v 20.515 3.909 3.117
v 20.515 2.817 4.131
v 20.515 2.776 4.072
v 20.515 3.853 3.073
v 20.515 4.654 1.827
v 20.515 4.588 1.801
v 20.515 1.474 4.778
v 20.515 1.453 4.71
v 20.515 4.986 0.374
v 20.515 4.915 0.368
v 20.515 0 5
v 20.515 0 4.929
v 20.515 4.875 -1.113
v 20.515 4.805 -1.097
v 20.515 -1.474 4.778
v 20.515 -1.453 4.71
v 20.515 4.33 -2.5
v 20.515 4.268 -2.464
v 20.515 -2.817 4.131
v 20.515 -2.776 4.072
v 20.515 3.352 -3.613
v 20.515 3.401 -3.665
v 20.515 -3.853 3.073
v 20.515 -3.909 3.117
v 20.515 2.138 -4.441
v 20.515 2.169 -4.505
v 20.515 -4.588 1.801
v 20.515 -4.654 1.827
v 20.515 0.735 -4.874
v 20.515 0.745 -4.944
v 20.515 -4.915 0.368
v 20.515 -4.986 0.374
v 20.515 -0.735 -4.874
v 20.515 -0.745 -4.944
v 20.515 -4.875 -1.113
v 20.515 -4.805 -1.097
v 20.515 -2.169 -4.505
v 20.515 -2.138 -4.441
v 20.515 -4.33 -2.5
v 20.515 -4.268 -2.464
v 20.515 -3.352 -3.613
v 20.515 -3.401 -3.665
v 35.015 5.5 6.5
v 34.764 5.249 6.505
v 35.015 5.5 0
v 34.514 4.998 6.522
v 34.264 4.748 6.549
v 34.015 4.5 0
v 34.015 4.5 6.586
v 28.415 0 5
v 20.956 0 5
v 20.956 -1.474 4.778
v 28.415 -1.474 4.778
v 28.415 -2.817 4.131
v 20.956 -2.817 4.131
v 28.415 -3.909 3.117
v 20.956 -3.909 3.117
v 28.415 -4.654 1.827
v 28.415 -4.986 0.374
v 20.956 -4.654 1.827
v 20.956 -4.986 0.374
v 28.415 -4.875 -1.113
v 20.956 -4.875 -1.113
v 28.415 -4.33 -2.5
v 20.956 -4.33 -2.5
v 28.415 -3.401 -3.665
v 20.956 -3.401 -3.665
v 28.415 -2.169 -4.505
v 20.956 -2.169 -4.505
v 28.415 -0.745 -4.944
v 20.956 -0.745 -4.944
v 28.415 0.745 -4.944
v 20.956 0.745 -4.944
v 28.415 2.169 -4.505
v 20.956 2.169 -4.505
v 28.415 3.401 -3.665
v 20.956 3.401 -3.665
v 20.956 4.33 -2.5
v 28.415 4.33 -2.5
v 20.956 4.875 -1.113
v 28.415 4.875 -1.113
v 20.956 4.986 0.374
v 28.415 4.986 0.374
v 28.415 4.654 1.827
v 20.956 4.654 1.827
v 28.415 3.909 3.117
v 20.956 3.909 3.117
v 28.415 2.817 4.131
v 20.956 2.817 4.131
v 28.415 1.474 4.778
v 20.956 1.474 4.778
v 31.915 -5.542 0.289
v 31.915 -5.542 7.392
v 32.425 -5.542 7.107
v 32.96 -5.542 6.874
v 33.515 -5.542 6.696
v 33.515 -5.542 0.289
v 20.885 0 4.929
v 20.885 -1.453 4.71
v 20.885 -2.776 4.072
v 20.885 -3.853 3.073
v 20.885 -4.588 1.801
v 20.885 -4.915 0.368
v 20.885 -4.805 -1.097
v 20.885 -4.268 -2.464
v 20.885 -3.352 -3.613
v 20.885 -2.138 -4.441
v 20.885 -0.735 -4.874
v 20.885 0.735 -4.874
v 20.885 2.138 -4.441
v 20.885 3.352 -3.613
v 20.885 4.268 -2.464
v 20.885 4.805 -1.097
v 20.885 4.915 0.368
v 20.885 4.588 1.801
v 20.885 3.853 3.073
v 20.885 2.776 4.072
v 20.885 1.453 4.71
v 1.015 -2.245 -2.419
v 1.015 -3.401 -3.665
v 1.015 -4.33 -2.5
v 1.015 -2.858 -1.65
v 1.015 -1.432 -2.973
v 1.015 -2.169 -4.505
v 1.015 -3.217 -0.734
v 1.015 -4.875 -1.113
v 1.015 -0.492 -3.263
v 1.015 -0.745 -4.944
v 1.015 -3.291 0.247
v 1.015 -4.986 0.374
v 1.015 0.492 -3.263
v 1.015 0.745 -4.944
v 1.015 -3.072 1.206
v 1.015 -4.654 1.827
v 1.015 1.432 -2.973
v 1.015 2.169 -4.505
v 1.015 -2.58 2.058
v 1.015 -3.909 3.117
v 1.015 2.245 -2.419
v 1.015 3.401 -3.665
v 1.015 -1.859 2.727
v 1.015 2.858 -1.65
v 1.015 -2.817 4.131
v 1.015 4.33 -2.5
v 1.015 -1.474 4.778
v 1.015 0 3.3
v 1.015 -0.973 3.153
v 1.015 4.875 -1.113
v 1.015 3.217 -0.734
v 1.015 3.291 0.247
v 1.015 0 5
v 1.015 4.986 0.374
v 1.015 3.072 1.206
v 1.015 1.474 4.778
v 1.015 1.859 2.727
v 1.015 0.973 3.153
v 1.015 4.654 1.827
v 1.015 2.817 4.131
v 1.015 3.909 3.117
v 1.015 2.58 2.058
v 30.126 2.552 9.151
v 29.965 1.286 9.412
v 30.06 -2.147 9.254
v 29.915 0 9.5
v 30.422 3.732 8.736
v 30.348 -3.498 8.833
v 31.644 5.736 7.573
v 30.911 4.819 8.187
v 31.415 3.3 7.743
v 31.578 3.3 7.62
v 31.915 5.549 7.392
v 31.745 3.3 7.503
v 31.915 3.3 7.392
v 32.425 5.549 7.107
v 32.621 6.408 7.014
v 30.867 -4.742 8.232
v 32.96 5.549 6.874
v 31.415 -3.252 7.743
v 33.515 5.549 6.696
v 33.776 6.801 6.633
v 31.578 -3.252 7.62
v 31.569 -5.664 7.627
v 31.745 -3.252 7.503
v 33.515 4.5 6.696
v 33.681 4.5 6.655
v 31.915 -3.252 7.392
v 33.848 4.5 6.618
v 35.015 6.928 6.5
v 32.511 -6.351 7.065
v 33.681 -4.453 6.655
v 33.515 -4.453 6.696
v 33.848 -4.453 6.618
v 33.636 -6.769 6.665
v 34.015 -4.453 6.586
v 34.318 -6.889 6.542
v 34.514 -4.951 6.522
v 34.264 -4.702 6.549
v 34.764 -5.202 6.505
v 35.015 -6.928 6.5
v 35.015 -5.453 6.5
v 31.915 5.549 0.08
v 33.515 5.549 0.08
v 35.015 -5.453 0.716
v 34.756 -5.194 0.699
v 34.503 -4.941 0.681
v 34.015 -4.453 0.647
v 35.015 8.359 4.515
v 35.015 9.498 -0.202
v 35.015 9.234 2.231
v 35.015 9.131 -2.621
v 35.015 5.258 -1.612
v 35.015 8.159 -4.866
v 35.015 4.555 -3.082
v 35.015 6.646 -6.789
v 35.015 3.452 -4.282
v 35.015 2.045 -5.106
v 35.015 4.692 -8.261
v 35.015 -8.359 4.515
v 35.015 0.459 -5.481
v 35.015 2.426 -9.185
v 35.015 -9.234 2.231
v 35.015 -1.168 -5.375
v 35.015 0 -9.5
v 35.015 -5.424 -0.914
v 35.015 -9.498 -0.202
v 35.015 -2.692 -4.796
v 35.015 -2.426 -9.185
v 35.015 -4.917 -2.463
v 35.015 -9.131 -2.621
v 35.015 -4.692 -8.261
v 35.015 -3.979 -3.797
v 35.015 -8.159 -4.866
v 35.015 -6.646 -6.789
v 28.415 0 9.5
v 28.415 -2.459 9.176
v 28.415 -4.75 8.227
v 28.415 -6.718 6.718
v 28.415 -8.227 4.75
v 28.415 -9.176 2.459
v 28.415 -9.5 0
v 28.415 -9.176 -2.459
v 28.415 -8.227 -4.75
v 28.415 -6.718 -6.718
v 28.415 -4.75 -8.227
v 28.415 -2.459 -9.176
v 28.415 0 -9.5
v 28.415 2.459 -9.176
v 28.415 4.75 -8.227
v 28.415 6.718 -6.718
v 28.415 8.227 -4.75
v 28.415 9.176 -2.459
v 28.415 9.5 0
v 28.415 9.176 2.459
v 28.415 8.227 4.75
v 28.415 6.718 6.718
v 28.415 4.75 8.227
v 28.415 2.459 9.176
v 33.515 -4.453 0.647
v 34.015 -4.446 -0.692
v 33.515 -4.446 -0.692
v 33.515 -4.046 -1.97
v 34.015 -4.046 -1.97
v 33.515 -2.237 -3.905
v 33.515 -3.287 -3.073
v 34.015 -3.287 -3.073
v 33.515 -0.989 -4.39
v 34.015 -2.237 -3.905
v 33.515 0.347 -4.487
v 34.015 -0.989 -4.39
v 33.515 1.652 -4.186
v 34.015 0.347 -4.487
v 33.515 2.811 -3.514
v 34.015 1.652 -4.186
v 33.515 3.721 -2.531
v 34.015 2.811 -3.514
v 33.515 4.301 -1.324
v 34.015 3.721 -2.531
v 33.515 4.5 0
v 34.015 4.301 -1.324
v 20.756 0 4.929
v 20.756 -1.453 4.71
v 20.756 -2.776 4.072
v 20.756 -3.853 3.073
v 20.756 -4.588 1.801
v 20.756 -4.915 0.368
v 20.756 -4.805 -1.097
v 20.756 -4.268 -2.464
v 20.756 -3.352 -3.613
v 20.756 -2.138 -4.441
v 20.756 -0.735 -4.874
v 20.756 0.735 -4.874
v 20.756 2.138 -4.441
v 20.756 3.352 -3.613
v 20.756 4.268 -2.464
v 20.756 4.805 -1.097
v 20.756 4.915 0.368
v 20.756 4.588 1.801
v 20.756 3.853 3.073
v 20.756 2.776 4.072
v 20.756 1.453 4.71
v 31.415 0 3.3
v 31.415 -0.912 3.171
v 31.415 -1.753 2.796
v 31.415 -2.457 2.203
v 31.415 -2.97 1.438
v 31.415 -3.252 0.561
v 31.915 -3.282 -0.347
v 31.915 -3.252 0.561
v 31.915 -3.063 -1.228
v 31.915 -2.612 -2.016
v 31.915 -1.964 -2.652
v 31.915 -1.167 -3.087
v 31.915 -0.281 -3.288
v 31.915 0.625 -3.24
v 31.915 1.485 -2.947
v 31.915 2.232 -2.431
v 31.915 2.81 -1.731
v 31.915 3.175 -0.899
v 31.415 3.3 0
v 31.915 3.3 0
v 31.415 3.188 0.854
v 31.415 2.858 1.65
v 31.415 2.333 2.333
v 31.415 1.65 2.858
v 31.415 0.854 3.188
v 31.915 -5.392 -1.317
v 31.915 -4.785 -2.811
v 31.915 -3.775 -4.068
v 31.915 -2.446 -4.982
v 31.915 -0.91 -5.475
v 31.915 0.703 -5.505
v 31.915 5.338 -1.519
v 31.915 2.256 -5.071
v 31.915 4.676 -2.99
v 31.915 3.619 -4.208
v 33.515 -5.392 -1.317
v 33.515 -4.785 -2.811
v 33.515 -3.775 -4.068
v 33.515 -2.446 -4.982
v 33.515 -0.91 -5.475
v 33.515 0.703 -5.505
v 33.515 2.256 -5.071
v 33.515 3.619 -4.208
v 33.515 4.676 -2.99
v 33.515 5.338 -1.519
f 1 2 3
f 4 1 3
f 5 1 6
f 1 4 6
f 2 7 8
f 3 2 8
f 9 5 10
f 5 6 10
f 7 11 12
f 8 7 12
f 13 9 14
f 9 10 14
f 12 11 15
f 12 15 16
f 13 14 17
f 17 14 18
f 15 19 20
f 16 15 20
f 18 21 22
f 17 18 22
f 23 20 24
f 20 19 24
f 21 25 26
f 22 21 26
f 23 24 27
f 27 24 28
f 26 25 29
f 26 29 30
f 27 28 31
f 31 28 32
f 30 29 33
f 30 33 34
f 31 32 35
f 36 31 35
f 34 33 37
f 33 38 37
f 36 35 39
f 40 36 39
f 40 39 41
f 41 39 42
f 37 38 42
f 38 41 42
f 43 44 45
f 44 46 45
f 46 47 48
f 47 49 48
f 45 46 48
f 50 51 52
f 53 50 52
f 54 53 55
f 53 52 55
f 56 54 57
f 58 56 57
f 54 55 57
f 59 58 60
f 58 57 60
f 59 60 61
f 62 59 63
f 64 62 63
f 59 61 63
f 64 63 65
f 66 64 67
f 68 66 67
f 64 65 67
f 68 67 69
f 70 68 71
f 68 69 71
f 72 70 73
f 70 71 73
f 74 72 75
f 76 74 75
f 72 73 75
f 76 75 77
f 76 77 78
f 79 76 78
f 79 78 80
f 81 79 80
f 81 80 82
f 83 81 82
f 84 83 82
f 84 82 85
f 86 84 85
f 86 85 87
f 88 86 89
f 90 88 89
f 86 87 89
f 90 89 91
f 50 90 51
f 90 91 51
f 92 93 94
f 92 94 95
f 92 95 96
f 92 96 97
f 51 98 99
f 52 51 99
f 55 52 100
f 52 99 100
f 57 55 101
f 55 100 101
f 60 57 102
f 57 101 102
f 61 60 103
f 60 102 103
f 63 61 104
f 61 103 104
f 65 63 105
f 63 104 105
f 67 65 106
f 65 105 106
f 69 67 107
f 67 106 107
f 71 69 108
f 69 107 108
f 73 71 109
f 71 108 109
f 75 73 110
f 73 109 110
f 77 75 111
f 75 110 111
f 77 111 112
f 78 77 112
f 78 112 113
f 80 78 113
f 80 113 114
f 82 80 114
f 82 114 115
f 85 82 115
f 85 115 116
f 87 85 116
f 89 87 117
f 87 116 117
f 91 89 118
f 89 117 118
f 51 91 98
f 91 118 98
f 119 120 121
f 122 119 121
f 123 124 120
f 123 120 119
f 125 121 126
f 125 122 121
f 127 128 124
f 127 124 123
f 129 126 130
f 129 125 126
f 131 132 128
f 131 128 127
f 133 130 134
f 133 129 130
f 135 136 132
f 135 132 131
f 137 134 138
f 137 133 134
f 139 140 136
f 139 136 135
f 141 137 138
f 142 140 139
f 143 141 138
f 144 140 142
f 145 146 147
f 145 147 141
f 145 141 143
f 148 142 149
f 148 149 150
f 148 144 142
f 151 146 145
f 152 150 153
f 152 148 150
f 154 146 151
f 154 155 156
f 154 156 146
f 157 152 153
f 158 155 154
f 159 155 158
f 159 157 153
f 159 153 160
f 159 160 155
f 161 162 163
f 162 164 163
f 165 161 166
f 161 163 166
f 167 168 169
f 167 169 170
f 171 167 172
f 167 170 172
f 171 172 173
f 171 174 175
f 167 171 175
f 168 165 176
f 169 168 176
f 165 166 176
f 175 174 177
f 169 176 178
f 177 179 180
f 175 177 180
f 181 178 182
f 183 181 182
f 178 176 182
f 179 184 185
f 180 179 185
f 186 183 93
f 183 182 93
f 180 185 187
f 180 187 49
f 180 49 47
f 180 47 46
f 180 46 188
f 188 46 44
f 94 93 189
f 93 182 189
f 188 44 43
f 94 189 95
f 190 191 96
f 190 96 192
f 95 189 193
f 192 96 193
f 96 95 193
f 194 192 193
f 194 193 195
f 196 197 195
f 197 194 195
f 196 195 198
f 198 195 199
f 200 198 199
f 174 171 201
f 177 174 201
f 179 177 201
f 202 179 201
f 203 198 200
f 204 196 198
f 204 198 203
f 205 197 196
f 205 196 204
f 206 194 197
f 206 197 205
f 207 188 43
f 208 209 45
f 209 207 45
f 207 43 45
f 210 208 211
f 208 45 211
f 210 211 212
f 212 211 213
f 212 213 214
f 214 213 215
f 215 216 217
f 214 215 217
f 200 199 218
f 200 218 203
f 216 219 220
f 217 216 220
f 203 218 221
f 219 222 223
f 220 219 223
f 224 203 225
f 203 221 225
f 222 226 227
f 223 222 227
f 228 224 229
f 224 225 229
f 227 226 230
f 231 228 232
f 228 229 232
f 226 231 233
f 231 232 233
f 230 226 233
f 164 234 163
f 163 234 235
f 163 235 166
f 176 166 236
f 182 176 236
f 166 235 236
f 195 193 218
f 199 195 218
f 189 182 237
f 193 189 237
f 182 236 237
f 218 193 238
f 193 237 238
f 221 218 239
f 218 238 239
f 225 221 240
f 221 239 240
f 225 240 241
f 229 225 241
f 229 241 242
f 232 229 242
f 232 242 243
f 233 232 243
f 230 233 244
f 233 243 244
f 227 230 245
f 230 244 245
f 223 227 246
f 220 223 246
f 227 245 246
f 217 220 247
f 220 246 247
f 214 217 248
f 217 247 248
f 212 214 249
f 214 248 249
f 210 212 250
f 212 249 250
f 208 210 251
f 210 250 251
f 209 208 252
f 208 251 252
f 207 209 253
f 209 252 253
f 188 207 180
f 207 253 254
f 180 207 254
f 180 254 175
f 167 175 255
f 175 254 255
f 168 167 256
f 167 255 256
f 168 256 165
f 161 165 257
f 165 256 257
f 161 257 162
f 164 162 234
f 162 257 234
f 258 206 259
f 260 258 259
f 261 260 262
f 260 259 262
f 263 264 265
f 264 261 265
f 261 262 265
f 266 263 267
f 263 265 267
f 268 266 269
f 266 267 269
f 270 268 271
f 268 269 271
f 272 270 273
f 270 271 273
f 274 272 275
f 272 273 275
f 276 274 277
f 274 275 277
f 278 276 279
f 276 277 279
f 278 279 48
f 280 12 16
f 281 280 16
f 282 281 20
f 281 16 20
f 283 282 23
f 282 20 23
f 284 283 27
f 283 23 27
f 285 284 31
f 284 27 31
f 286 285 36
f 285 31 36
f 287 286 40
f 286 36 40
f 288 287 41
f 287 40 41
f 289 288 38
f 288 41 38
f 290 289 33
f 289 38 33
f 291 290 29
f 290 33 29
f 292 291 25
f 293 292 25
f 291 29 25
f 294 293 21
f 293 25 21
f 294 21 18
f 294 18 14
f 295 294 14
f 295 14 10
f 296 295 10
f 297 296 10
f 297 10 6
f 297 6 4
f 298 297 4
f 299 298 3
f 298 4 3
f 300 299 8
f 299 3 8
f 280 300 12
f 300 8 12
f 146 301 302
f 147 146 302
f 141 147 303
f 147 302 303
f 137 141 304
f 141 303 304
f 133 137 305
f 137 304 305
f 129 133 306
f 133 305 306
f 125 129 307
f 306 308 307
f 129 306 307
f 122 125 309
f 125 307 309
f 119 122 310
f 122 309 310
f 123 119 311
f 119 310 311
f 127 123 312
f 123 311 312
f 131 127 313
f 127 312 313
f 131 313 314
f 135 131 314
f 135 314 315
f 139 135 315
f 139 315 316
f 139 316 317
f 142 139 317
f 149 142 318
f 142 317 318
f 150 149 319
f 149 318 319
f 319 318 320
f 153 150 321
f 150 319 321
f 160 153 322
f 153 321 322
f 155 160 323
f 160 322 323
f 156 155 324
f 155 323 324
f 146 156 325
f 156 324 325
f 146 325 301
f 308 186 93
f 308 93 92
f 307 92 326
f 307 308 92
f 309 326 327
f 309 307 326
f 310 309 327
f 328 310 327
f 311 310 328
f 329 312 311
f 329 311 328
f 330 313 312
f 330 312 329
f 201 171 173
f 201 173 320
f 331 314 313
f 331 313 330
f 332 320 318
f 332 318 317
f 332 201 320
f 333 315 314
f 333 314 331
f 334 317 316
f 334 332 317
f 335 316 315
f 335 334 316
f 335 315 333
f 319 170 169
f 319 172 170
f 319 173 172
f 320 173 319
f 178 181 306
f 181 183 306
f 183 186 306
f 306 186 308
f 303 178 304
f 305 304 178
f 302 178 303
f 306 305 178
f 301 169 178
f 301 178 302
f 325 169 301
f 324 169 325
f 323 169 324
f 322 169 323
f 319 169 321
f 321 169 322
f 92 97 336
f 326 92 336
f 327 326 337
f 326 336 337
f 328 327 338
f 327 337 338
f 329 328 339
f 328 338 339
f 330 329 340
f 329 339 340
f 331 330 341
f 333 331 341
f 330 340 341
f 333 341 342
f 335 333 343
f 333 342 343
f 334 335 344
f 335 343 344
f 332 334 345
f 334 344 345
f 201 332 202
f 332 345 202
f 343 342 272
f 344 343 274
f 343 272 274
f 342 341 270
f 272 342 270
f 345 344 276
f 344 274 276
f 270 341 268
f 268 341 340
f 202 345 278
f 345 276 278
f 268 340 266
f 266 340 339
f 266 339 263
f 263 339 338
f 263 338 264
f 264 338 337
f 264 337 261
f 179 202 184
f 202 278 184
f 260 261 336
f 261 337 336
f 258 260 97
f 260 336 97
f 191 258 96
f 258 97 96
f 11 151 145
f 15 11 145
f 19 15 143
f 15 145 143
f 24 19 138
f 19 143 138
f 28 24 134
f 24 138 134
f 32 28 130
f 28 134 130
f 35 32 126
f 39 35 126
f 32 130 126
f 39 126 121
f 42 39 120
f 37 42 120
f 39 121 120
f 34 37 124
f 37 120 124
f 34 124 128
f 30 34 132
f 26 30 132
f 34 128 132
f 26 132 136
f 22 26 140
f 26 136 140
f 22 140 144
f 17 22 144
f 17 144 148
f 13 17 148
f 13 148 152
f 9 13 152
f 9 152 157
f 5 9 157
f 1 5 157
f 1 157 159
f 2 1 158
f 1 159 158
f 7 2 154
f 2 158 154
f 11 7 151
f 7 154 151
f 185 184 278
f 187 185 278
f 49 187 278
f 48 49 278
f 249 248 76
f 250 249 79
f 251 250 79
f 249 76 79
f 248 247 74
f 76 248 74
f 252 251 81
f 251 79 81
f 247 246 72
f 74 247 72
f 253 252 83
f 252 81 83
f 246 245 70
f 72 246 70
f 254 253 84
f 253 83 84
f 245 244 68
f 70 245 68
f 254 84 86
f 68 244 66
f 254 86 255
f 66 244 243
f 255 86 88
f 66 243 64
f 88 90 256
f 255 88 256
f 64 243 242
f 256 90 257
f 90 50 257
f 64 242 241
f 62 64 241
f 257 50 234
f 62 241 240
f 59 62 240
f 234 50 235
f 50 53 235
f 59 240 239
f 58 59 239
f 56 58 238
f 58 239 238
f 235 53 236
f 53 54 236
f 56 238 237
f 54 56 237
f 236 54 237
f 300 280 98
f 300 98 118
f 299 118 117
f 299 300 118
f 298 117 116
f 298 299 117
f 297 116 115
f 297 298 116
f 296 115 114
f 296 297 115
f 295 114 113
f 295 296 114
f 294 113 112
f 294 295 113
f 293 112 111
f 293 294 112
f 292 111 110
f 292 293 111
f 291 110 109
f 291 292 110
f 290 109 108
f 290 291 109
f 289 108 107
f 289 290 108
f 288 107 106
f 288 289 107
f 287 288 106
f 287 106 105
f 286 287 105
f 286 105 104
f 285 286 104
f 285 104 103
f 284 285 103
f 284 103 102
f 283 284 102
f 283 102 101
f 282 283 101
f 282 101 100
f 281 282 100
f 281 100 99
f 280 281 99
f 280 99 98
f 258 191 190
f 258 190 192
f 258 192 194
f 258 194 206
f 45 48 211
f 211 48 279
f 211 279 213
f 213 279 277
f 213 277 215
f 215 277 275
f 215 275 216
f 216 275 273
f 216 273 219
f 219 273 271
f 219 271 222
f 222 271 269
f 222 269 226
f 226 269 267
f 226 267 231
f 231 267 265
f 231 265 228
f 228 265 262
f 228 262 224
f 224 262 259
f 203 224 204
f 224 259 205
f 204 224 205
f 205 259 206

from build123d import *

# Parameters (mm, degrees)
CHANFRO3_SIZE              = 0.2
ESBO_O3_W                  = 12.082799142
ESBO_O3_H                  = 11.091873023
CORTE_EXTRUS_O1_DEPTH      = 1.6
ESBO_O4_W                  = 12.202436568
ESBO_O4_H                  = 8.953230152
CORTE_EXTRUS_O2_DEPTH      = 4
ESBO_O11_R                 = 6.241505963
CORTE_EXTRUS_O5_DEPTH      = 1
ESBO_O5_W                  = 9.712143391
ESBO_O5_H                  = 6.552029914
CORTE_EXTRUS_O3_DEPTH      = 0.5
CORTE_EXTRUS_O4_DEPTH      = 38.504431422
CORTE_EXTRUS_O4_DEPTH_BACK = 38.504431422
CHANFRO6_SIZE              = 1


with BuildPart() as part:
    # Esboço1 → Revolução1 (revolve)
    with BuildSketch(Plane(origin=(0, 0, 0), x_dir=(1, 0, 0), z_dir=(0, 1, 0)), mode=Mode.PRIVATE) as revolu_o1_sk:
        Polygon((35.015459104, 4.5), (35.015459104, 9.5), (28.415459104, 9.5), (28.415459104, 5), (20.75612147, 5), (20.75612147, 4.928604204), (20.515459104, 4.928604204), (20.515459104, 5), (0.015459104, 5), (0.015459104, 3.3), (31.915459104, 3.3), (31.915459104, 5.55), (33.515459104, 5.55), (33.515459104, 4.5), align=None)
    revolve(revolu_o1_sk.sketch.rotate(Axis((0, 0, 0), (1, 0, 0)), 180), axis=Axis((0, 0, 0), (1, 0, 0)))

    # Chanfro3
    # the kernel refuses this chamfer: 0.2 mm, written as the material it takes off along each edge
    with BuildSketch(Plane(origin=(20.75612147, 0, 0), x_dir=(0, 0, 1), z_dir=(0, 1, 0))) as chanfro3_piece_1_section:
        Polygon((5, CHANFRO3_SIZE), (5 - CHANFRO3_SIZE, 0), (5, 0), align=None)
    chanfro3_piece_1 = revolve(axis=Axis((20.75612147, 0, 0), (1, 0, 0)), mode=Mode.PRIVATE)
    chanfro3_piece_1 = chanfro3_piece_1 - Plane(origin=(20.918018136, 0, 0), x_dir=(0, 0, 1), z_dir=(-1, 0, 0)) * Cylinder(4.928604204, 21, mode=Mode.PRIVATE)
    add(chanfro3_piece_1, mode=Mode.SUBTRACT)

    # Esboço3 → Corte-extrusão1 (cut)
    with BuildSketch(Plane(origin=(31.915459104, 0, 0), x_dir=(0, 0, -1), z_dir=(1, 0, 0))):
        with Locations((-6.041399571, 0.003483257)):
            Rectangle(ESBO_O3_W, ESBO_O3_H)
    extrude(amount=CORTE_EXTRUS_O1_DEPTH, mode=Mode.SUBTRACT)

    # Esboço4 → Corte-extrusão2 (cut)
    with BuildSketch(Plane(origin=(31.915459104, 0, 0), x_dir=(0, 0, -1), z_dir=(1, 0, 0))):
        with Locations((-6.101218284, 0.023384924)):
            Rectangle(ESBO_O4_W, ESBO_O4_H)
    extrude(amount=CORTE_EXTRUS_O2_DEPTH, mode=Mode.SUBTRACT)

    # Esboço11 → Corte-extrusão5 (cut)
    with BuildSketch(Plane.ZY.offset(-0.015459104)):
        Circle(ESBO_O11_R)
    extrude(amount=-CORTE_EXTRUS_O5_DEPTH, mode=Mode.SUBTRACT)

    # Esboço5 → Corte-extrusão3 (cut)
    with BuildSketch(Plane(origin=(31.915459104, 0, 0), x_dir=(0, 0, -1), z_dir=(1, 0, 0))):
        with Locations((-4.856071696, 0.023985043)):
            Rectangle(ESBO_O5_W, ESBO_O5_H)
    extrude(amount=-CORTE_EXTRUS_O3_DEPTH, mode=Mode.SUBTRACT)

    # Esboço6 → Corte-extrusão4 (cut, two sides: drawn at the far end of the back side and taken through both)
    with BuildSketch(Plane(origin=(0, 0, 0), x_dir=(1, 0, 0), z_dir=(0, 1, 0)).offset(-CORTE_EXTRUS_O4_DEPTH_BACK)):
        with BuildLine():
            ThreePointArc((29.915459104, -9.5), (32.056996665, -7.305613855), (35.015459104, -6.5))
            add(Edge.make_bspline(
                [(29.915459104, -9.5), (30.631864389, -12.277391552), (37.640288769, -12.30241828), (36.765568572, -6.851347348), (35.015459104, -6.5)],
                knots=[0, 0, 0, 0, 0.632855425, 1, 1, 1, 1], degree=3))
        make_face()
    extrude(amount=CORTE_EXTRUS_O4_DEPTH + CORTE_EXTRUS_O4_DEPTH_BACK, mode=Mode.SUBTRACT)

    # Chanfro6
    chanfro6_edges = [part.edges().sort_by_distance(p)[0] for p in [
        (35.015459104, -4.453230152, 3.573551082),
        (35.015459104, 4.5, 3.25),
        (35.015459104, -0.324395064, -4.488292308),
    ]]
    chamfer(chanfro6_edges, length=CHANFRO6_SIZE)


solid = part.part
